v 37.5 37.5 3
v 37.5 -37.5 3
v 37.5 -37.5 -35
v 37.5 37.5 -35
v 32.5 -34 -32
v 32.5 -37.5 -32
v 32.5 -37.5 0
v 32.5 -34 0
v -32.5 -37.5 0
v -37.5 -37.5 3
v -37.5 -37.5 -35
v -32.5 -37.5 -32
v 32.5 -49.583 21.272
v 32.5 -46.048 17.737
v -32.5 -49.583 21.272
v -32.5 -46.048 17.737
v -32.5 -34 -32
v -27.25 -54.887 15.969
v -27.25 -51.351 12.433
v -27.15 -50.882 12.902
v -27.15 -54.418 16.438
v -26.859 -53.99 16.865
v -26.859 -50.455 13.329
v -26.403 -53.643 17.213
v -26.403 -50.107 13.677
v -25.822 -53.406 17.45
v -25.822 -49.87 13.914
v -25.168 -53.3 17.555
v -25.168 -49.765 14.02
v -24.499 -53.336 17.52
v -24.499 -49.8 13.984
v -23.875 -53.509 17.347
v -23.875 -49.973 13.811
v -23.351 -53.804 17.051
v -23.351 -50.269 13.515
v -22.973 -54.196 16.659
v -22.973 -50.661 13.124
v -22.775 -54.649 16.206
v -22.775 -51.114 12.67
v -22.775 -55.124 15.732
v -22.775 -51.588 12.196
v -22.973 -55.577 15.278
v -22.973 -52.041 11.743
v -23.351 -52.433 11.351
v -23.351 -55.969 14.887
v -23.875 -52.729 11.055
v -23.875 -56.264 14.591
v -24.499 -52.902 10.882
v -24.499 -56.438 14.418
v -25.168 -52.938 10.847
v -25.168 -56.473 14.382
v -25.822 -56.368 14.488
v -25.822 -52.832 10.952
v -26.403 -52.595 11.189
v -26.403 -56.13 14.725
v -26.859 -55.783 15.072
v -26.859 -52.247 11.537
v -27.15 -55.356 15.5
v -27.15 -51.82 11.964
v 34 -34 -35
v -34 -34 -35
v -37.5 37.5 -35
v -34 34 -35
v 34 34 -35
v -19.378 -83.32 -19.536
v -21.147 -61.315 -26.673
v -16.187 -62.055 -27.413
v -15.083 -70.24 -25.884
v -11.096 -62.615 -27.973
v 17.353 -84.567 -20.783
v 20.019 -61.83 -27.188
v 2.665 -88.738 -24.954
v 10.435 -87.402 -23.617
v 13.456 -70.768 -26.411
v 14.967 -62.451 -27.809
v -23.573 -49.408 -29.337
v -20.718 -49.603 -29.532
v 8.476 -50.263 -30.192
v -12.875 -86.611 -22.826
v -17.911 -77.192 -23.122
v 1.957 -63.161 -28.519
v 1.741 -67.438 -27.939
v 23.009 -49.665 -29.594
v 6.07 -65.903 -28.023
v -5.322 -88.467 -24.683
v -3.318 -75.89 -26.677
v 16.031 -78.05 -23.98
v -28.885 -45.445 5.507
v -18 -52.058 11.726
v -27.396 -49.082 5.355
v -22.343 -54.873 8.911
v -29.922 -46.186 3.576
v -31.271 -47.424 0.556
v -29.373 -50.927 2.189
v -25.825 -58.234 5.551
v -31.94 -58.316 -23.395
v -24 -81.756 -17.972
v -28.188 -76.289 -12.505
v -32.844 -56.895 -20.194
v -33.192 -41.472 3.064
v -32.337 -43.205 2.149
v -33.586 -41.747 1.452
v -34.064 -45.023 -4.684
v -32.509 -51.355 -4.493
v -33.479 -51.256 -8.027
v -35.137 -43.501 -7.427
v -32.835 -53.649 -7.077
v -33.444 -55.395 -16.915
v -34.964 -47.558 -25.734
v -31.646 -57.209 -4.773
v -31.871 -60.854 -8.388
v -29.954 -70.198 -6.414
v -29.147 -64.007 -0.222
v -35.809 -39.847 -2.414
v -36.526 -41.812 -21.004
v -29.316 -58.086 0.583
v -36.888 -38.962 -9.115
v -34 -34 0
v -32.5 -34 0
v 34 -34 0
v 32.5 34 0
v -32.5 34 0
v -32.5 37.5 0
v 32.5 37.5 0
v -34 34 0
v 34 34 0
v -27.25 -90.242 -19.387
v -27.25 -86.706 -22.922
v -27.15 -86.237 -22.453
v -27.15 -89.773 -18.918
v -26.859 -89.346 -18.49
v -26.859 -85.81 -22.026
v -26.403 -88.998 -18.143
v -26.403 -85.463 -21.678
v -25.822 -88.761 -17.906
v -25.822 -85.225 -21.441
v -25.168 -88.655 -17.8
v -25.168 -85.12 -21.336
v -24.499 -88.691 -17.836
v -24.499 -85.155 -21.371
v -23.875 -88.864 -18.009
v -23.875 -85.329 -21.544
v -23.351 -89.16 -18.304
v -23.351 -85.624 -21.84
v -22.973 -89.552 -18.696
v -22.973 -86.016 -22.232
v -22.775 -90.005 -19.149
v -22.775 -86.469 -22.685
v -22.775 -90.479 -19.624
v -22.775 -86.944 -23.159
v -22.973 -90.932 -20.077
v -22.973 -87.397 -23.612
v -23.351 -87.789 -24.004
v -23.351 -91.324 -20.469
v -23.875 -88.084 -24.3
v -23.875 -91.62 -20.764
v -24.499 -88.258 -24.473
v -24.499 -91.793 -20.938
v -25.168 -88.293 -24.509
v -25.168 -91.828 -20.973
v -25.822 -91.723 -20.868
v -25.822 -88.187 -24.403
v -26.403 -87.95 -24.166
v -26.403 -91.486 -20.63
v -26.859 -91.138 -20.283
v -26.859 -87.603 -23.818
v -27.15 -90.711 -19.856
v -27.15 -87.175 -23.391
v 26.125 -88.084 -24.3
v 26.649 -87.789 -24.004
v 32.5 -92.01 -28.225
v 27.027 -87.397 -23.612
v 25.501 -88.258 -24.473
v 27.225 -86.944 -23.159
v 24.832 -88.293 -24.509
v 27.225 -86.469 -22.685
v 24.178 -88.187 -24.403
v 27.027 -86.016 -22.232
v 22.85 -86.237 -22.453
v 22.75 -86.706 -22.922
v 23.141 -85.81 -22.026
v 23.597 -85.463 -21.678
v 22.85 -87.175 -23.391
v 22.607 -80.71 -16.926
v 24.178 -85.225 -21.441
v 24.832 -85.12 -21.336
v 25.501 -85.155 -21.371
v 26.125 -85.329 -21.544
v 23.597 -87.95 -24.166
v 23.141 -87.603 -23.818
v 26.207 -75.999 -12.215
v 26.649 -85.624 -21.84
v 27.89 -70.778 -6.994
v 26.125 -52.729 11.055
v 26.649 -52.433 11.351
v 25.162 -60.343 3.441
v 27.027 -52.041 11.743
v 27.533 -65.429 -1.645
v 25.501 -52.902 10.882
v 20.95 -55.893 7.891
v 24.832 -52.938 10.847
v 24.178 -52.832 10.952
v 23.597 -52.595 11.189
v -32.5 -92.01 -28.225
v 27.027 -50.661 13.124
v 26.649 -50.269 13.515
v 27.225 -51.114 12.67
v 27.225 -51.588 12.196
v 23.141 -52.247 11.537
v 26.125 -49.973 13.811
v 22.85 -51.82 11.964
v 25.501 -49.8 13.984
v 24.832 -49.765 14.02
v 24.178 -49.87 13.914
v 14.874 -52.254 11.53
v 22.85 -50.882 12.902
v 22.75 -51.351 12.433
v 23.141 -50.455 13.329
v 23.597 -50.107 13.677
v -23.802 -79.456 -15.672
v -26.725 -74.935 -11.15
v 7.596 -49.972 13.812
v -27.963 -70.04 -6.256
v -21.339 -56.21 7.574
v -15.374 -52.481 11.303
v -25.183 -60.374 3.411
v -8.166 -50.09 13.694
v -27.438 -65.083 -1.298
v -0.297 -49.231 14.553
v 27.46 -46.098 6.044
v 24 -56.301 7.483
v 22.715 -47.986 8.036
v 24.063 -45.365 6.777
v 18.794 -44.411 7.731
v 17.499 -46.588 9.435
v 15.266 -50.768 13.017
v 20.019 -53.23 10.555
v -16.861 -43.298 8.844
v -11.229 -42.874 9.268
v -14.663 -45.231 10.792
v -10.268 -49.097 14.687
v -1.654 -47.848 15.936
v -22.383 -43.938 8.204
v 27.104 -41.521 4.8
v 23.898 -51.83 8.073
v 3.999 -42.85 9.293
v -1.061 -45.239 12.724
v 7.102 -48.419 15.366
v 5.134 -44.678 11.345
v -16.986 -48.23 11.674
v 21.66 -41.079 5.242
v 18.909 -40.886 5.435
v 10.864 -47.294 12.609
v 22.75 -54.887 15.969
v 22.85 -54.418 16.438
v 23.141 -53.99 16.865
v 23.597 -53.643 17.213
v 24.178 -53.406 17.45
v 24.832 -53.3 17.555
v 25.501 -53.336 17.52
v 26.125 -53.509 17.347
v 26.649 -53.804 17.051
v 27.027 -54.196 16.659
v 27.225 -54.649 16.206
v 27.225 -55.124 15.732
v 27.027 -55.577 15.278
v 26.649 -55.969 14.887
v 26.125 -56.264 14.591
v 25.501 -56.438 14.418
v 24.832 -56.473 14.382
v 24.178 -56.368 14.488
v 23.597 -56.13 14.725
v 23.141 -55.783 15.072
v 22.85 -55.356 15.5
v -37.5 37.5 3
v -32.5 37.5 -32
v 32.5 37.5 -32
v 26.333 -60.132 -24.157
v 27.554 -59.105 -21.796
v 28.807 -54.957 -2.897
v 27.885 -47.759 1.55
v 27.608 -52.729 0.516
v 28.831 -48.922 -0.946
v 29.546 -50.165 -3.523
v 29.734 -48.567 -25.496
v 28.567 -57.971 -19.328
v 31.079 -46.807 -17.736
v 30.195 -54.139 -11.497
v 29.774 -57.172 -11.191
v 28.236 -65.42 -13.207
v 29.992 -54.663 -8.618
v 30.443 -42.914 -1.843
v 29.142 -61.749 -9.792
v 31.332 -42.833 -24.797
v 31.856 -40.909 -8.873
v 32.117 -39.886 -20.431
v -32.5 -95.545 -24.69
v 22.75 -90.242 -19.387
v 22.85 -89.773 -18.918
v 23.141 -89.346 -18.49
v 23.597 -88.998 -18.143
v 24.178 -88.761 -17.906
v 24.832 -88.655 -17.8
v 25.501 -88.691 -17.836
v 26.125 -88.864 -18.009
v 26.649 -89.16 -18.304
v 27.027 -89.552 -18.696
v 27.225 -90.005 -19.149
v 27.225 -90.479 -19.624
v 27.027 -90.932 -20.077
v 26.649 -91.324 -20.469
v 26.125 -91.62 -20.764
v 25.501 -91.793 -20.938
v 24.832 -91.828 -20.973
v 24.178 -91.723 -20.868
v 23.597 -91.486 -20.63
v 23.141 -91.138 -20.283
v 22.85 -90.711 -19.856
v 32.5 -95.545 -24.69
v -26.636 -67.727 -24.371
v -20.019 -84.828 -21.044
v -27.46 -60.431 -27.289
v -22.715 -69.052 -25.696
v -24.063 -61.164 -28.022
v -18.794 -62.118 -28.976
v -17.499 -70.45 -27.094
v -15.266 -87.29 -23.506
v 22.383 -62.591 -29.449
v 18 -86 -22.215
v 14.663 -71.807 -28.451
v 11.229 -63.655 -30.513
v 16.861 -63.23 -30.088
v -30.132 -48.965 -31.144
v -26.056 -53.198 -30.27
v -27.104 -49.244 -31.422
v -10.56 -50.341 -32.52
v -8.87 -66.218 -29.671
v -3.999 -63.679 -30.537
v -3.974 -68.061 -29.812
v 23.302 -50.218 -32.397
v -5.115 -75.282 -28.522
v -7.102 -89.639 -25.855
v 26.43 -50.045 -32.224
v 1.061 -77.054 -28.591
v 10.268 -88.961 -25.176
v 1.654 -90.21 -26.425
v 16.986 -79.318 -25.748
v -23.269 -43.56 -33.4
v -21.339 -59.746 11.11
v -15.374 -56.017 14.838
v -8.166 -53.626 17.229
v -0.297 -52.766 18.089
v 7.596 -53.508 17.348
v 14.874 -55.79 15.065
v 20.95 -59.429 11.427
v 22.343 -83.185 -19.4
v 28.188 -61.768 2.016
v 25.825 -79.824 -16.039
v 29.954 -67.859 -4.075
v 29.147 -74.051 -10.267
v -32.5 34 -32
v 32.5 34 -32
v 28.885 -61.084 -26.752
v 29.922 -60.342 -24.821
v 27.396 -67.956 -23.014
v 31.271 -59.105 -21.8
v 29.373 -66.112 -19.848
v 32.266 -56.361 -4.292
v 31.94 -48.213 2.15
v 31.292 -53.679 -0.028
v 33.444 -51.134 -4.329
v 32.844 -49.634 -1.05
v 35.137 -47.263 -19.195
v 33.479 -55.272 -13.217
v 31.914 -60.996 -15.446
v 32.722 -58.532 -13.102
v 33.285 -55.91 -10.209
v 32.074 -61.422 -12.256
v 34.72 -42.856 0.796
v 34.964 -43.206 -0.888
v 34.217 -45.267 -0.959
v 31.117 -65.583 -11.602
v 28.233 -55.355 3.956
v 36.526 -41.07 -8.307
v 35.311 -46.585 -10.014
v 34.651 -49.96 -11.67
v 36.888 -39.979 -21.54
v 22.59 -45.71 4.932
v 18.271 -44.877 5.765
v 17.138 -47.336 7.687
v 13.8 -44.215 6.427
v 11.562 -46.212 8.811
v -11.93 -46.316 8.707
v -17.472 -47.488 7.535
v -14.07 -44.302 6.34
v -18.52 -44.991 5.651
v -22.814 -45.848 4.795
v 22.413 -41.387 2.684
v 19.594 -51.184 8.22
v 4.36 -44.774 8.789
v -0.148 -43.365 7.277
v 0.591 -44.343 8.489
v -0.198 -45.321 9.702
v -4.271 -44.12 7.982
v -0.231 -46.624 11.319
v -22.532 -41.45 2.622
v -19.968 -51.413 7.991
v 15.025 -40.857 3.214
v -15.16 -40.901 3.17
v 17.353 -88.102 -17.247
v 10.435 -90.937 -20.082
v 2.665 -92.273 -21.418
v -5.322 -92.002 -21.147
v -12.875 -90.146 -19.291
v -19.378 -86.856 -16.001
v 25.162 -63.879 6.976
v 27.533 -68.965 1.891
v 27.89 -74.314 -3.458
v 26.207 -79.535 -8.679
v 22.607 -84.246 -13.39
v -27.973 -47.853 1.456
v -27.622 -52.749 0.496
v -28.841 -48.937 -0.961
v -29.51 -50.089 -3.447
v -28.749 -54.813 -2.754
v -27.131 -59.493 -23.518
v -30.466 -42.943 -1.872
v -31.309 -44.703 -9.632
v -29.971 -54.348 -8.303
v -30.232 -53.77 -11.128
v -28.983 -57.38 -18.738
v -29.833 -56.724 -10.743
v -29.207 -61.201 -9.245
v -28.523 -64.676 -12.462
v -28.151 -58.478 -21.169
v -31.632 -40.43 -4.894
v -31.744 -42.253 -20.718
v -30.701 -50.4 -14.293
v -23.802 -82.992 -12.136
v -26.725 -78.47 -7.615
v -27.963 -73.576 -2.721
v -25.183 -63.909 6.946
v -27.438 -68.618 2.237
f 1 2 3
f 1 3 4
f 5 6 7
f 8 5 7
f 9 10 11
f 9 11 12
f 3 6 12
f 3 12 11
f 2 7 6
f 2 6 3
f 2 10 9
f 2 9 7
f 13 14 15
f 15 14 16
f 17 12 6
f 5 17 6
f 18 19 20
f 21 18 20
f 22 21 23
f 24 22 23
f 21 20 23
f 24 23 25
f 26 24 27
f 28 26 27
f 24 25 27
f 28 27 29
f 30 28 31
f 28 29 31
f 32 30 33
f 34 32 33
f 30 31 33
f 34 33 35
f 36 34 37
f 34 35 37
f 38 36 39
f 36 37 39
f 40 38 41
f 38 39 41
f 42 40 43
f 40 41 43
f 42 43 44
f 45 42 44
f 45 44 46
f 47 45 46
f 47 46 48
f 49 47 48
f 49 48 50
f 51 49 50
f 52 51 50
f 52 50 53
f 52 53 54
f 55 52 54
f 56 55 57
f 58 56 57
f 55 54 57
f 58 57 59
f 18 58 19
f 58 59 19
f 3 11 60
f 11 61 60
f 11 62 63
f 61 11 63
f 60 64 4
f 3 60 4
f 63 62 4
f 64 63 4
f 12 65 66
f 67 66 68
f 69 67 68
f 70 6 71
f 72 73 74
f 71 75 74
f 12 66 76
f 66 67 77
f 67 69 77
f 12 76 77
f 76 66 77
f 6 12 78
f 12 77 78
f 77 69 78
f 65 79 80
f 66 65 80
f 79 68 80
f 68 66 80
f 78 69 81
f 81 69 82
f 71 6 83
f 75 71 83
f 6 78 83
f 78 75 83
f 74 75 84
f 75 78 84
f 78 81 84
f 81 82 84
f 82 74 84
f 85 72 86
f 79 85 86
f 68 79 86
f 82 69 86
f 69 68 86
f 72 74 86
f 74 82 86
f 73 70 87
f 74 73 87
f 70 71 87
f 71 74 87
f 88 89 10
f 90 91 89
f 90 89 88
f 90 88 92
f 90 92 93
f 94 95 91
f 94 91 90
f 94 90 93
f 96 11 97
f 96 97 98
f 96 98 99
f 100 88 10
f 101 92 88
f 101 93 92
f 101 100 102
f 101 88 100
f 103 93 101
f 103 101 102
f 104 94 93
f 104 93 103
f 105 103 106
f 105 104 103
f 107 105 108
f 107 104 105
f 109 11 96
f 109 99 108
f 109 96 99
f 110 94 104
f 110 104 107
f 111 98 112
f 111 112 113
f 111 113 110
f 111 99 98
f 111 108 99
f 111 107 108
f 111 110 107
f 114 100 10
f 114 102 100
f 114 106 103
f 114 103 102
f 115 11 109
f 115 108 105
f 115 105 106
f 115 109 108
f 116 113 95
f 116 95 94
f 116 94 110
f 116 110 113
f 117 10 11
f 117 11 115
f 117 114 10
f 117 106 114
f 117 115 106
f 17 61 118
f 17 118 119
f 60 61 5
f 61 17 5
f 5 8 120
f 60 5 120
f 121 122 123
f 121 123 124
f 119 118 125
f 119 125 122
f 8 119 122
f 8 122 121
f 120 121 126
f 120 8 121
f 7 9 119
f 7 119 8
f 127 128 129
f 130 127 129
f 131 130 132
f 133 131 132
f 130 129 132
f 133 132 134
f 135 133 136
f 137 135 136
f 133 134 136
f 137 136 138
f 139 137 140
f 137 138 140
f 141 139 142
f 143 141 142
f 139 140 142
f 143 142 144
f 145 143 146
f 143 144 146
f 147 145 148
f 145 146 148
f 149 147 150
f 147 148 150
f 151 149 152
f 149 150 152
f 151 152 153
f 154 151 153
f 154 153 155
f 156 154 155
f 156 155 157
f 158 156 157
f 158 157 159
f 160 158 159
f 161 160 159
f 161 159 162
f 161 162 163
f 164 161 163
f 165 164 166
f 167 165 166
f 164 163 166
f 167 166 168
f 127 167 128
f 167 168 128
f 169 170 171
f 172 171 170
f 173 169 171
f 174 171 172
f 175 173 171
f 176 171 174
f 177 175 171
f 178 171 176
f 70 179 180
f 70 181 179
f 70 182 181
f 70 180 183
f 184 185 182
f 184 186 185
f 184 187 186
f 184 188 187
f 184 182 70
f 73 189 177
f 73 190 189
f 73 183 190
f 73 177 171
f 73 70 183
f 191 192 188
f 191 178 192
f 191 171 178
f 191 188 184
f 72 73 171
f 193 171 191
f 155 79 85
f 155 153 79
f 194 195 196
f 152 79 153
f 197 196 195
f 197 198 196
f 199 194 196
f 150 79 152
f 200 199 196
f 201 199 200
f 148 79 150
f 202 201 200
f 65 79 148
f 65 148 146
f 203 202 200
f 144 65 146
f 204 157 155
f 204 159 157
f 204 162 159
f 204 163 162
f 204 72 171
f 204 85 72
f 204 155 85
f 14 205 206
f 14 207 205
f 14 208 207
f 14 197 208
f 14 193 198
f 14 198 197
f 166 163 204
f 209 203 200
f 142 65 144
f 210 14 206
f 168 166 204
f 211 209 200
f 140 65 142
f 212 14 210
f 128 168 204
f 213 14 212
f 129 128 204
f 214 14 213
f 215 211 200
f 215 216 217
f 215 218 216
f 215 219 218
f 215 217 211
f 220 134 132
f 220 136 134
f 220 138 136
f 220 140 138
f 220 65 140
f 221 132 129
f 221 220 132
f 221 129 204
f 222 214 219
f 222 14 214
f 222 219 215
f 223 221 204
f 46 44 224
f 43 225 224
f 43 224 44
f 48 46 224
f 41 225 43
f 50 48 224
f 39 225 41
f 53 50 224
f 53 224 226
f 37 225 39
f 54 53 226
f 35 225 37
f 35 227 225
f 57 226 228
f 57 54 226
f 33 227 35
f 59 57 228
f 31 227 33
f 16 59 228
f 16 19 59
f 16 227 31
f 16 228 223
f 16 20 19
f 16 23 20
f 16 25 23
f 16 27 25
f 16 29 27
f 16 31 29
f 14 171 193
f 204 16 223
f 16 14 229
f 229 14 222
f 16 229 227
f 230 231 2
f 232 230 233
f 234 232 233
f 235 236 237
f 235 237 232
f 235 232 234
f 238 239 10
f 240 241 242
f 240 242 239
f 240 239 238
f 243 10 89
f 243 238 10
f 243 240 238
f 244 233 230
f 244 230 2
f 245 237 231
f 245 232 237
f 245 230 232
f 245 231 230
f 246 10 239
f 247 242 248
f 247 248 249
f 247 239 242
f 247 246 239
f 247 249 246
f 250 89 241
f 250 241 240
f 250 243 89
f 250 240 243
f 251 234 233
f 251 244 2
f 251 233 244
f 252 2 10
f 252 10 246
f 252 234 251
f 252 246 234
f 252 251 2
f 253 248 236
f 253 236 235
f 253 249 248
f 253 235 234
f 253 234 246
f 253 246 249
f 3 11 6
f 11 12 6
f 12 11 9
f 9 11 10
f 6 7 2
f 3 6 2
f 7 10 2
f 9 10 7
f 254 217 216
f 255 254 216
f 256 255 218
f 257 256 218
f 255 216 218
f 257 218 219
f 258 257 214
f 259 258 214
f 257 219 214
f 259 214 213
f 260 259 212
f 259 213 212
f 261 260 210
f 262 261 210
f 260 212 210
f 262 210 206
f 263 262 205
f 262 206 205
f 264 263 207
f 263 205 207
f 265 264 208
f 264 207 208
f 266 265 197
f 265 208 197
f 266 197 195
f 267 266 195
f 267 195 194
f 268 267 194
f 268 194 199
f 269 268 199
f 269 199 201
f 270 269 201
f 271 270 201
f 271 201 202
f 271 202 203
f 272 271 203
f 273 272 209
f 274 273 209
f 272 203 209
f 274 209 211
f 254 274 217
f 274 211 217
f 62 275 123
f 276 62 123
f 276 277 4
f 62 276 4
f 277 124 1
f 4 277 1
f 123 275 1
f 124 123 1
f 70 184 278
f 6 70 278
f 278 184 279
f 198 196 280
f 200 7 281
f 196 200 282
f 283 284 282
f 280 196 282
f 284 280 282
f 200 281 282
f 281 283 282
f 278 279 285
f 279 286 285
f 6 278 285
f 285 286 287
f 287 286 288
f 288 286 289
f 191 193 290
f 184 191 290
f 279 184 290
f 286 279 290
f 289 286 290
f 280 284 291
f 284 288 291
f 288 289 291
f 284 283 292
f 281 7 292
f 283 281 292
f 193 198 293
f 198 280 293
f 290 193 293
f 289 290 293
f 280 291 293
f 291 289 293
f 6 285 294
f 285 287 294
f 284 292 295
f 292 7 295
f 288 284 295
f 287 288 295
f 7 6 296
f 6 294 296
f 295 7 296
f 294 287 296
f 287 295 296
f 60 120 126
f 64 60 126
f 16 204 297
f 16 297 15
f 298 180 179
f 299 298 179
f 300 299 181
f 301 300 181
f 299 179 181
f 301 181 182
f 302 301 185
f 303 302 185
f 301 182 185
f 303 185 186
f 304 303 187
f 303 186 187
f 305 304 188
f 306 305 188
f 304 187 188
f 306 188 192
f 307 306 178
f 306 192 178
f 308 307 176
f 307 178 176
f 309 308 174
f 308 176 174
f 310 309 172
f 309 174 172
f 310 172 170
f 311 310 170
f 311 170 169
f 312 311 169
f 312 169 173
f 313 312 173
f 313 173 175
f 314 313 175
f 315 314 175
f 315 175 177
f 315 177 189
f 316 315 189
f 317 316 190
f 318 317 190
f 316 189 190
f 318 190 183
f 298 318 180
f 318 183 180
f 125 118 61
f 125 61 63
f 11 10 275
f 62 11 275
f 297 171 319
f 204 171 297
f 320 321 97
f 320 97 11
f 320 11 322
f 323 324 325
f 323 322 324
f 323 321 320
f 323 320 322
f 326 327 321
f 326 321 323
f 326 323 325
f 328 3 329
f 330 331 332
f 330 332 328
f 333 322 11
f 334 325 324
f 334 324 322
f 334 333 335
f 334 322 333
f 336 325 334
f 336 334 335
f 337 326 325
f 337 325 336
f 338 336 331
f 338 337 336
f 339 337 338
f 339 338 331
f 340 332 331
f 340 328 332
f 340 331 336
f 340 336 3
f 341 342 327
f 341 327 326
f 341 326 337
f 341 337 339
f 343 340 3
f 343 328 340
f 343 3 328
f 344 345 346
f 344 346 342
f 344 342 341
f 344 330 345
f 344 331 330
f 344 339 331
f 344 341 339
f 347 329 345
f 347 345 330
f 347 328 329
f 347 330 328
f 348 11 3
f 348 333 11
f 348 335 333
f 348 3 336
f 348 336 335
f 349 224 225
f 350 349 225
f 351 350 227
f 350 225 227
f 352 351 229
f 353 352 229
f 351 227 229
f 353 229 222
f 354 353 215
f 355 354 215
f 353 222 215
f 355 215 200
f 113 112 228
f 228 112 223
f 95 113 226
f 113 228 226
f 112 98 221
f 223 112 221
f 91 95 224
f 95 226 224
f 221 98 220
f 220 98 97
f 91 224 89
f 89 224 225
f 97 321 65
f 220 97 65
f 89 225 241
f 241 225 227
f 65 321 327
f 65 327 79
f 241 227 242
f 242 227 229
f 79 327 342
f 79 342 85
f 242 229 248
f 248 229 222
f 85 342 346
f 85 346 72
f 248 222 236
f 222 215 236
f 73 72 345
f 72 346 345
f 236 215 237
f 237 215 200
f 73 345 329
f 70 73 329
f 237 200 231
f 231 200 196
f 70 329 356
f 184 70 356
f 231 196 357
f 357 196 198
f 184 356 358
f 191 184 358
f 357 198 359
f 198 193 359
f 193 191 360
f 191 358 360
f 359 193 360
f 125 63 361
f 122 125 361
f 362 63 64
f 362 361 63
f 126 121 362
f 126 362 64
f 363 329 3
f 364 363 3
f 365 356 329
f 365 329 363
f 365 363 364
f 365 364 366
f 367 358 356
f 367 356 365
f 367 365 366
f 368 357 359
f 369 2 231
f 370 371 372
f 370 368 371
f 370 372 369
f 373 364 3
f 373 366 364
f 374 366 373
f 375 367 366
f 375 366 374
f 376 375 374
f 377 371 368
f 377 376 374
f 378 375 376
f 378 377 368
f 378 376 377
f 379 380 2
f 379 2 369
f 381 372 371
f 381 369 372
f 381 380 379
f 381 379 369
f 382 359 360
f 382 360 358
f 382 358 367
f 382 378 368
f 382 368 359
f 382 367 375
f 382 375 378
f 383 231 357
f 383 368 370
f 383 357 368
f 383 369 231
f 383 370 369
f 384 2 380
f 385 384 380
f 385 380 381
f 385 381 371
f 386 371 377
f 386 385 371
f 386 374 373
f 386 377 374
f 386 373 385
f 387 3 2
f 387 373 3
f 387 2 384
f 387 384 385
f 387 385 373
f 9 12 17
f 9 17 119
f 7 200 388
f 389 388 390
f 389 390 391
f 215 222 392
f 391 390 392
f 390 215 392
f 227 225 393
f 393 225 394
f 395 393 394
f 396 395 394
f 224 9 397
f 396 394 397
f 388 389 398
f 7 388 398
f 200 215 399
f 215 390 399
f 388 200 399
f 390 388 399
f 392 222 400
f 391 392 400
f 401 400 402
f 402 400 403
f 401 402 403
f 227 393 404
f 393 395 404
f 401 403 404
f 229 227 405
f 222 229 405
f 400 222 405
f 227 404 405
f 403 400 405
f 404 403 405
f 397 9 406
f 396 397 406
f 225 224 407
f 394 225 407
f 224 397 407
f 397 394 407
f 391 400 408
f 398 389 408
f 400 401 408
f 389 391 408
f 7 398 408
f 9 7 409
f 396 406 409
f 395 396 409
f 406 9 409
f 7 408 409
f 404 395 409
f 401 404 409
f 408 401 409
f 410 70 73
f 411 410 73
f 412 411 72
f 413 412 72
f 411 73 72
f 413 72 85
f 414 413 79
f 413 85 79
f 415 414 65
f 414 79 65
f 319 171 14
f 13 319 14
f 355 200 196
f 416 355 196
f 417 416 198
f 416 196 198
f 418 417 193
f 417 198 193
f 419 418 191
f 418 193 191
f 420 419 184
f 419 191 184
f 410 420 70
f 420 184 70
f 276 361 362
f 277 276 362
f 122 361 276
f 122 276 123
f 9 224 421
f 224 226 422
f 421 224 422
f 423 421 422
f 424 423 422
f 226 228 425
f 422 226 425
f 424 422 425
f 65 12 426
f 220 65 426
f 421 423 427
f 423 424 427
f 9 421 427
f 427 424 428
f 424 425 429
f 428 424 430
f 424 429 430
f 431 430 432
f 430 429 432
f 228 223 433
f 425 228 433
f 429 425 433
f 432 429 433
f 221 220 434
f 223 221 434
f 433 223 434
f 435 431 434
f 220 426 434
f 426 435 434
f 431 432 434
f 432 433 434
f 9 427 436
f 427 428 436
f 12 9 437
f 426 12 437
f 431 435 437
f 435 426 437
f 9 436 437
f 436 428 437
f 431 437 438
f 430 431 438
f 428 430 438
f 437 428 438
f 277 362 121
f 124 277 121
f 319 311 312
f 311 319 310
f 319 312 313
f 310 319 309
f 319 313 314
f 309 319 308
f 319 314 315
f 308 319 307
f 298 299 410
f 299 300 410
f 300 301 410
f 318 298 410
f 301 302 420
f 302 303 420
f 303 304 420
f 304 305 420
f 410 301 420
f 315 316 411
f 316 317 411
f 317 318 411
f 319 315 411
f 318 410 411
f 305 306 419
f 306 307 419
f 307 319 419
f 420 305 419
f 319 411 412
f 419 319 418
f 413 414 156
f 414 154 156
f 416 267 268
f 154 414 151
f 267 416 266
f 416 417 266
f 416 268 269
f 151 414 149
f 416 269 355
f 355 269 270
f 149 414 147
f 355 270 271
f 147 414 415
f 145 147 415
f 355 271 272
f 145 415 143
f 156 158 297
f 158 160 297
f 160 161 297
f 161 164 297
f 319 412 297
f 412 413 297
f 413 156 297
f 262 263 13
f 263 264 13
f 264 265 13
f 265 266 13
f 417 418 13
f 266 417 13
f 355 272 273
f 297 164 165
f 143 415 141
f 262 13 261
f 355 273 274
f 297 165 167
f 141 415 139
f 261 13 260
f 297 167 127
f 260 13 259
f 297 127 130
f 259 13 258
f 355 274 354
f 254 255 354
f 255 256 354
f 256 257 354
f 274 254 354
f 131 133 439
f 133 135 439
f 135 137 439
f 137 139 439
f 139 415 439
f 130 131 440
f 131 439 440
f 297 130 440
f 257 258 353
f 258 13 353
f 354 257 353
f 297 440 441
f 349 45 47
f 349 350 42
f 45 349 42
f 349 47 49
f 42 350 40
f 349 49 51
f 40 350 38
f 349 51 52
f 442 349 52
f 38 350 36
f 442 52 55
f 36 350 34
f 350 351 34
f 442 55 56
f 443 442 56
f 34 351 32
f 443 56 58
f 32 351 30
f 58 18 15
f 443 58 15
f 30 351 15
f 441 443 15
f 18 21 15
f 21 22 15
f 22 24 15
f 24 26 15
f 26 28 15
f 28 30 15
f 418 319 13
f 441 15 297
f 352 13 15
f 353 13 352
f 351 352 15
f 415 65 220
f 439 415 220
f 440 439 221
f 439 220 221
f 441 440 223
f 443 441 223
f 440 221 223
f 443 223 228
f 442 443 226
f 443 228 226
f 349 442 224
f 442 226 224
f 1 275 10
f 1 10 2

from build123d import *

# Parameters (mm, degrees)
F1_W      = 75
F1_H      = 75
F2_DEPTH  = 38
F3_W      = 68
F3_H      = 68
F4_DEPTH  = 35
F6_W      = 65
F6_H      = 32
F7_DEPTH  = 75
F9_W      = 65
F9_H      = 32
F10_W     = 75
F10_H     = 38
F18_DEPTH = 5
F21_R     = 2.25
F22_DEPTH = 5
F19_W     = 65
F19_H     = 65
F23_DEPTH = 5


# Not quite as in the source:
# - a feature of the source that left no trace in its solid (it failed there, or was rolled back) is left out
# - the arcs of a loft's sections are written as splines that run evenly, so that the points pair up as in the source's solid


with BuildPart() as f2:
    # F1 (on offset) → F2 (new body)
    with BuildSketch(Plane.XY.offset(3)):
        Rectangle(F1_W, F1_H)
    extrude(amount=-F2_DEPTH)


with BuildPart() as f4:
    # F3 (on Top) → F4 (new body, through all)
    with BuildSketch(Plane.XY):
        Rectangle(F3_W, F3_H)
    extrude(amount=-F4_DEPTH)


with BuildPart() as f2_1:
    add(f2.part)

    # F5: cut F4
    add(f4.part, mode=Mode.SUBTRACT)


with BuildPart() as f7:
    # F6 (on face) → F7 (new body, through all)
    with BuildSketch(Plane.XZ.offset(37.5)):
        with Locations((0, -16)):
            Rectangle(F6_W, F6_H)
    extrude(amount=-F7_DEPTH)


with BuildPart() as f2_2:
    add(f2_1.part)

    # F8: cut F7
    add(f7.part, mode=Mode.SUBTRACT)


with BuildPart() as f15:
    # F9 (on face) → F15 section 0
    with BuildSketch(Plane.XZ.offset(37.5)):
        with Locations((0, -16)):
            Rectangle(F9_W, F9_H)
    # F14 (on offset) → F15 section 1
    with BuildSketch(Plane(origin=(0, -31.8921356237, 31.8921356237), x_dir=(-1, 0, 0), z_dir=(0, 0.7071067812, -0.7071067812))):
        with BuildLine():
            ThreePointArc((19.3777270669, -72.7305613051), (27.9634183298, -53.9499033063), (21.3394636211, -34.3910067794))
            ThreePointArc((21.3394636211, -34.3910067794), (0.2969683656, -24.5206618662), (-20.9501510919, -33.9424573448))
            ThreePointArc((-20.9501510919, -33.9424573448), (-27.8904955693, -54.9930022936), (-17.3532530257, -74.4932675145))
            ThreePointArc((-17.3532530257, -74.4932675145), (1.3421650722, -80.4869005137), (19.3777270669, -72.7305613051))
        make_face()
    loft()


with BuildPart() as f17:
    # F10 (on face) → F17 section 0
    with BuildSketch(Plane.XZ.offset(37.5)):
        with Locations((0, -16)):
            Rectangle(F10_W, F10_H)
    # F16 (on offset) → F17 section 1
    with BuildSketch(Plane(origin=(0, -31.8921356237, 31.8921356237), x_dir=(-1, 0, 0), z_dir=(0, 0.7071067812, -0.7071067812))):
        with BuildLine():
            add(Edge.make_bspline(
                [(-24.0003369849, -34.5195363186), (-25.1784048219, -36.090354701), (-26.2017352476, -37.7771609273), (-27.8996955072, -41.31809129), (-28.5742833559, -43.1721278699), (-29.5488165406, -46.9762758623), (-29.8487377794, -48.9262932099), (-30.0623931254, -52.8474675582), (-29.9761219495, -54.8185276002), (-29.4206888016, -58.7060397732), (-28.9515405638, -60.6223957777), (-27.6483639065, -64.3268508627), (-26.8143677105, -66.1148583431), (-24.8135278918, -69.4938962086), (-23.6467337438, -71.0848430403), (-21.0251219159, -74.0086091562), (-19.5703690605, -75.3413561445), (-17.9995506781, -76.5194239816)],
                knots=[0, 0, 0, 0, 0.125, 0.125, 0.25, 0.25, 0.375, 0.375, 0.5, 0.5, 0.625, 0.625, 0.75, 0.75, 0.875, 0.875, 1, 1, 1, 1], degree=3))
            add(Edge.make_bspline(
                [(-17.9995506781, -76.5194239816), (-16.4287322957, -77.6974918186), (-14.7419260694, -78.7208222443), (-11.2009957067, -80.418782504), (-9.3469591268, -81.0933703526), (-5.5428111344, -82.0679035373), (-3.5927937869, -82.3678247761), (0.3283805615, -82.5814801221), (2.2994406035, -82.4952089462), (6.1869527765, -81.9397757983), (8.103308781, -81.4706275605), (11.8077638659, -80.1674509032), (13.5957713464, -79.3334547072), (16.9748092119, -77.3326148885), (18.5657560436, -76.1658207405), (21.4895221595, -73.5442089126), (22.8222691478, -72.0894560572), (24.0003369849, -70.5186376748)],
                knots=[0, 0, 0, 0, 0.125, 0.125, 0.25, 0.25, 0.375, 0.375, 0.5, 0.5, 0.625, 0.625, 0.75, 0.75, 0.875, 0.875, 1, 1, 1, 1], degree=3))
            add(Edge.make_bspline(
                [(24.0003369849, -70.5186376748), (25.1784048219, -68.9478192924), (26.2017352476, -67.2610130661), (27.8996955072, -63.7200827034), (28.5742833559, -61.8660461235), (29.5488165406, -58.0618981311), (29.8487377794, -56.1118807836), (30.0623931254, -52.1907064353), (29.9761219495, -50.2196463932), (29.4206888016, -46.3321342203), (28.9515405638, -44.4157782157), (27.6483639065, -40.7113231308), (26.8143677105, -38.9233156503), (24.8135278918, -35.5442777848), (23.6467337438, -33.9533309531), (21.0251219159, -31.0295648372), (19.5703690605, -29.6968178489), (17.9995506781, -28.5187500119)],
                knots=[0, 0, 0, 0, 0.125, 0.125, 0.25, 0.25, 0.375, 0.375, 0.5, 0.5, 0.625, 0.625, 0.75, 0.75, 0.875, 0.875, 1, 1, 1, 1], degree=3))
            add(Edge.make_bspline(
                [(17.9995506781, -28.5187500119), (16.4287322957, -27.3406821748), (14.7419260694, -26.3173517491), (11.2009957067, -24.6193914895), (9.3469591268, -23.9448036409), (5.5428111344, -22.9702704561), (3.5927937869, -22.6703492173), (-0.3283805615, -22.4566938713), (-2.2994406035, -22.5429650472), (-6.1869527765, -23.0983981951), (-8.103308781, -23.5675464329), (-11.8077638659, -24.8707230902), (-13.5957713464, -25.7047192862), (-16.9748092119, -27.7055591049), (-18.5657560436, -28.8723532529), (-21.4895221595, -31.4939650809), (-22.8222691478, -32.9487179362), (-24.0003369849, -34.5195363186)],
                knots=[0, 0, 0, 0, 0.125, 0.125, 0.25, 0.25, 0.375, 0.375, 0.5, 0.5, 0.625, 0.625, 0.75, 0.75, 0.875, 0.875, 1, 1, 1, 1], degree=3))
        make_face()
    loft(ruled=True)

    # F25: cut F15
    add(f15.part, mode=Mode.SUBTRACT)


with BuildPart() as f18:
    # F14 (on offset) → F18 (new body)
    with BuildSketch(Plane(origin=(0, -31.8921356237, 31.8921356237), x_dir=(-1, 0, 0), z_dir=(0, 0.7071067812, -0.7071067812))):
        with BuildLine():
            ThreePointArc((19.3777270669, -72.7305613051), (27.9634183298, -53.9499033063), (21.3394636211, -34.3910067794))
            ThreePointArc((21.3394636211, -34.3910067794), (0.2969683656, -24.5206618662), (-20.9501510919, -33.9424573448))
            ThreePointArc((-20.9501510919, -33.9424573448), (-27.8904955693, -54.9930022936), (-17.3532530257, -74.4932675145))
            ThreePointArc((-17.3532530257, -74.4932675145), (1.3421650722, -80.4869005137), (19.3777270669, -72.7305613051))
        make_face()
    extrude(amount=-F18_DEPTH)


with BuildPart() as f22:
    # F21 (on face) → F22 (new body)
    with BuildSketch(Plane(origin=(0, -31.8921356237, 31.8921356237), x_dir=(-1, 0, 0), z_dir=(0, 0.7071067812, -0.7071067812))):
        with Locations((-25, -27.5190869967)):
            Circle(F21_R)
    extrude(amount=-F22_DEPTH)


with BuildPart() as f22b:
    # F21 (on face) → F22, piece 2 (new body)
    with BuildSketch(Plane(origin=(0, -31.8921356237, 31.8921356237), x_dir=(-1, 0, 0), z_dir=(0, 0.7071067812, -0.7071067812))):
        with Locations((25, -27.5190869967)):
            Circle(F21_R)
    extrude(amount=-F22_DEPTH)


with BuildPart() as f22c:
    # F21 (on face) → F22, piece 3 (new body)
    with BuildSketch(Plane(origin=(0, -31.8921356237, 31.8921356237), x_dir=(-1, 0, 0), z_dir=(0, 0.7071067812, -0.7071067812))):
        with Locations((25, -77.5190869967)):
            Circle(F21_R)
    extrude(amount=-F22_DEPTH)


with BuildPart() as f22d:
    # F21 (on face) → F22, piece 4 (new body)
    with BuildSketch(Plane(origin=(0, -31.8921356237, 31.8921356237), x_dir=(-1, 0, 0), z_dir=(0, 0.7071067812, -0.7071067812))):
        with Locations((-25, -77.5190869967)):
            Circle(F21_R)
    extrude(amount=-F22_DEPTH)


with BuildPart() as f23:
    # F19 (on offset) → F23 (new body)
    with BuildSketch(Plane(origin=(0, -31.8921356237, 31.8921356237), x_dir=(-1, 0, 0), z_dir=(0, 0.7071067812, -0.7071067812))):
        with Locations((0, -52.5190869967)):
            Rectangle(F19_W, F19_H)
    extrude(amount=-F23_DEPTH)

    # F24: cut F22, F22b, F22c, F22d, F18
    add(f22.part, mode=Mode.SUBTRACT)
    add(f22b.part, mode=Mode.SUBTRACT)
    add(f22c.part, mode=Mode.SUBTRACT)
    add(f22d.part, mode=Mode.SUBTRACT)
    add(f18.part, mode=Mode.SUBTRACT)


solid = Compound([f2_2.part, f17.part, f23.part])
